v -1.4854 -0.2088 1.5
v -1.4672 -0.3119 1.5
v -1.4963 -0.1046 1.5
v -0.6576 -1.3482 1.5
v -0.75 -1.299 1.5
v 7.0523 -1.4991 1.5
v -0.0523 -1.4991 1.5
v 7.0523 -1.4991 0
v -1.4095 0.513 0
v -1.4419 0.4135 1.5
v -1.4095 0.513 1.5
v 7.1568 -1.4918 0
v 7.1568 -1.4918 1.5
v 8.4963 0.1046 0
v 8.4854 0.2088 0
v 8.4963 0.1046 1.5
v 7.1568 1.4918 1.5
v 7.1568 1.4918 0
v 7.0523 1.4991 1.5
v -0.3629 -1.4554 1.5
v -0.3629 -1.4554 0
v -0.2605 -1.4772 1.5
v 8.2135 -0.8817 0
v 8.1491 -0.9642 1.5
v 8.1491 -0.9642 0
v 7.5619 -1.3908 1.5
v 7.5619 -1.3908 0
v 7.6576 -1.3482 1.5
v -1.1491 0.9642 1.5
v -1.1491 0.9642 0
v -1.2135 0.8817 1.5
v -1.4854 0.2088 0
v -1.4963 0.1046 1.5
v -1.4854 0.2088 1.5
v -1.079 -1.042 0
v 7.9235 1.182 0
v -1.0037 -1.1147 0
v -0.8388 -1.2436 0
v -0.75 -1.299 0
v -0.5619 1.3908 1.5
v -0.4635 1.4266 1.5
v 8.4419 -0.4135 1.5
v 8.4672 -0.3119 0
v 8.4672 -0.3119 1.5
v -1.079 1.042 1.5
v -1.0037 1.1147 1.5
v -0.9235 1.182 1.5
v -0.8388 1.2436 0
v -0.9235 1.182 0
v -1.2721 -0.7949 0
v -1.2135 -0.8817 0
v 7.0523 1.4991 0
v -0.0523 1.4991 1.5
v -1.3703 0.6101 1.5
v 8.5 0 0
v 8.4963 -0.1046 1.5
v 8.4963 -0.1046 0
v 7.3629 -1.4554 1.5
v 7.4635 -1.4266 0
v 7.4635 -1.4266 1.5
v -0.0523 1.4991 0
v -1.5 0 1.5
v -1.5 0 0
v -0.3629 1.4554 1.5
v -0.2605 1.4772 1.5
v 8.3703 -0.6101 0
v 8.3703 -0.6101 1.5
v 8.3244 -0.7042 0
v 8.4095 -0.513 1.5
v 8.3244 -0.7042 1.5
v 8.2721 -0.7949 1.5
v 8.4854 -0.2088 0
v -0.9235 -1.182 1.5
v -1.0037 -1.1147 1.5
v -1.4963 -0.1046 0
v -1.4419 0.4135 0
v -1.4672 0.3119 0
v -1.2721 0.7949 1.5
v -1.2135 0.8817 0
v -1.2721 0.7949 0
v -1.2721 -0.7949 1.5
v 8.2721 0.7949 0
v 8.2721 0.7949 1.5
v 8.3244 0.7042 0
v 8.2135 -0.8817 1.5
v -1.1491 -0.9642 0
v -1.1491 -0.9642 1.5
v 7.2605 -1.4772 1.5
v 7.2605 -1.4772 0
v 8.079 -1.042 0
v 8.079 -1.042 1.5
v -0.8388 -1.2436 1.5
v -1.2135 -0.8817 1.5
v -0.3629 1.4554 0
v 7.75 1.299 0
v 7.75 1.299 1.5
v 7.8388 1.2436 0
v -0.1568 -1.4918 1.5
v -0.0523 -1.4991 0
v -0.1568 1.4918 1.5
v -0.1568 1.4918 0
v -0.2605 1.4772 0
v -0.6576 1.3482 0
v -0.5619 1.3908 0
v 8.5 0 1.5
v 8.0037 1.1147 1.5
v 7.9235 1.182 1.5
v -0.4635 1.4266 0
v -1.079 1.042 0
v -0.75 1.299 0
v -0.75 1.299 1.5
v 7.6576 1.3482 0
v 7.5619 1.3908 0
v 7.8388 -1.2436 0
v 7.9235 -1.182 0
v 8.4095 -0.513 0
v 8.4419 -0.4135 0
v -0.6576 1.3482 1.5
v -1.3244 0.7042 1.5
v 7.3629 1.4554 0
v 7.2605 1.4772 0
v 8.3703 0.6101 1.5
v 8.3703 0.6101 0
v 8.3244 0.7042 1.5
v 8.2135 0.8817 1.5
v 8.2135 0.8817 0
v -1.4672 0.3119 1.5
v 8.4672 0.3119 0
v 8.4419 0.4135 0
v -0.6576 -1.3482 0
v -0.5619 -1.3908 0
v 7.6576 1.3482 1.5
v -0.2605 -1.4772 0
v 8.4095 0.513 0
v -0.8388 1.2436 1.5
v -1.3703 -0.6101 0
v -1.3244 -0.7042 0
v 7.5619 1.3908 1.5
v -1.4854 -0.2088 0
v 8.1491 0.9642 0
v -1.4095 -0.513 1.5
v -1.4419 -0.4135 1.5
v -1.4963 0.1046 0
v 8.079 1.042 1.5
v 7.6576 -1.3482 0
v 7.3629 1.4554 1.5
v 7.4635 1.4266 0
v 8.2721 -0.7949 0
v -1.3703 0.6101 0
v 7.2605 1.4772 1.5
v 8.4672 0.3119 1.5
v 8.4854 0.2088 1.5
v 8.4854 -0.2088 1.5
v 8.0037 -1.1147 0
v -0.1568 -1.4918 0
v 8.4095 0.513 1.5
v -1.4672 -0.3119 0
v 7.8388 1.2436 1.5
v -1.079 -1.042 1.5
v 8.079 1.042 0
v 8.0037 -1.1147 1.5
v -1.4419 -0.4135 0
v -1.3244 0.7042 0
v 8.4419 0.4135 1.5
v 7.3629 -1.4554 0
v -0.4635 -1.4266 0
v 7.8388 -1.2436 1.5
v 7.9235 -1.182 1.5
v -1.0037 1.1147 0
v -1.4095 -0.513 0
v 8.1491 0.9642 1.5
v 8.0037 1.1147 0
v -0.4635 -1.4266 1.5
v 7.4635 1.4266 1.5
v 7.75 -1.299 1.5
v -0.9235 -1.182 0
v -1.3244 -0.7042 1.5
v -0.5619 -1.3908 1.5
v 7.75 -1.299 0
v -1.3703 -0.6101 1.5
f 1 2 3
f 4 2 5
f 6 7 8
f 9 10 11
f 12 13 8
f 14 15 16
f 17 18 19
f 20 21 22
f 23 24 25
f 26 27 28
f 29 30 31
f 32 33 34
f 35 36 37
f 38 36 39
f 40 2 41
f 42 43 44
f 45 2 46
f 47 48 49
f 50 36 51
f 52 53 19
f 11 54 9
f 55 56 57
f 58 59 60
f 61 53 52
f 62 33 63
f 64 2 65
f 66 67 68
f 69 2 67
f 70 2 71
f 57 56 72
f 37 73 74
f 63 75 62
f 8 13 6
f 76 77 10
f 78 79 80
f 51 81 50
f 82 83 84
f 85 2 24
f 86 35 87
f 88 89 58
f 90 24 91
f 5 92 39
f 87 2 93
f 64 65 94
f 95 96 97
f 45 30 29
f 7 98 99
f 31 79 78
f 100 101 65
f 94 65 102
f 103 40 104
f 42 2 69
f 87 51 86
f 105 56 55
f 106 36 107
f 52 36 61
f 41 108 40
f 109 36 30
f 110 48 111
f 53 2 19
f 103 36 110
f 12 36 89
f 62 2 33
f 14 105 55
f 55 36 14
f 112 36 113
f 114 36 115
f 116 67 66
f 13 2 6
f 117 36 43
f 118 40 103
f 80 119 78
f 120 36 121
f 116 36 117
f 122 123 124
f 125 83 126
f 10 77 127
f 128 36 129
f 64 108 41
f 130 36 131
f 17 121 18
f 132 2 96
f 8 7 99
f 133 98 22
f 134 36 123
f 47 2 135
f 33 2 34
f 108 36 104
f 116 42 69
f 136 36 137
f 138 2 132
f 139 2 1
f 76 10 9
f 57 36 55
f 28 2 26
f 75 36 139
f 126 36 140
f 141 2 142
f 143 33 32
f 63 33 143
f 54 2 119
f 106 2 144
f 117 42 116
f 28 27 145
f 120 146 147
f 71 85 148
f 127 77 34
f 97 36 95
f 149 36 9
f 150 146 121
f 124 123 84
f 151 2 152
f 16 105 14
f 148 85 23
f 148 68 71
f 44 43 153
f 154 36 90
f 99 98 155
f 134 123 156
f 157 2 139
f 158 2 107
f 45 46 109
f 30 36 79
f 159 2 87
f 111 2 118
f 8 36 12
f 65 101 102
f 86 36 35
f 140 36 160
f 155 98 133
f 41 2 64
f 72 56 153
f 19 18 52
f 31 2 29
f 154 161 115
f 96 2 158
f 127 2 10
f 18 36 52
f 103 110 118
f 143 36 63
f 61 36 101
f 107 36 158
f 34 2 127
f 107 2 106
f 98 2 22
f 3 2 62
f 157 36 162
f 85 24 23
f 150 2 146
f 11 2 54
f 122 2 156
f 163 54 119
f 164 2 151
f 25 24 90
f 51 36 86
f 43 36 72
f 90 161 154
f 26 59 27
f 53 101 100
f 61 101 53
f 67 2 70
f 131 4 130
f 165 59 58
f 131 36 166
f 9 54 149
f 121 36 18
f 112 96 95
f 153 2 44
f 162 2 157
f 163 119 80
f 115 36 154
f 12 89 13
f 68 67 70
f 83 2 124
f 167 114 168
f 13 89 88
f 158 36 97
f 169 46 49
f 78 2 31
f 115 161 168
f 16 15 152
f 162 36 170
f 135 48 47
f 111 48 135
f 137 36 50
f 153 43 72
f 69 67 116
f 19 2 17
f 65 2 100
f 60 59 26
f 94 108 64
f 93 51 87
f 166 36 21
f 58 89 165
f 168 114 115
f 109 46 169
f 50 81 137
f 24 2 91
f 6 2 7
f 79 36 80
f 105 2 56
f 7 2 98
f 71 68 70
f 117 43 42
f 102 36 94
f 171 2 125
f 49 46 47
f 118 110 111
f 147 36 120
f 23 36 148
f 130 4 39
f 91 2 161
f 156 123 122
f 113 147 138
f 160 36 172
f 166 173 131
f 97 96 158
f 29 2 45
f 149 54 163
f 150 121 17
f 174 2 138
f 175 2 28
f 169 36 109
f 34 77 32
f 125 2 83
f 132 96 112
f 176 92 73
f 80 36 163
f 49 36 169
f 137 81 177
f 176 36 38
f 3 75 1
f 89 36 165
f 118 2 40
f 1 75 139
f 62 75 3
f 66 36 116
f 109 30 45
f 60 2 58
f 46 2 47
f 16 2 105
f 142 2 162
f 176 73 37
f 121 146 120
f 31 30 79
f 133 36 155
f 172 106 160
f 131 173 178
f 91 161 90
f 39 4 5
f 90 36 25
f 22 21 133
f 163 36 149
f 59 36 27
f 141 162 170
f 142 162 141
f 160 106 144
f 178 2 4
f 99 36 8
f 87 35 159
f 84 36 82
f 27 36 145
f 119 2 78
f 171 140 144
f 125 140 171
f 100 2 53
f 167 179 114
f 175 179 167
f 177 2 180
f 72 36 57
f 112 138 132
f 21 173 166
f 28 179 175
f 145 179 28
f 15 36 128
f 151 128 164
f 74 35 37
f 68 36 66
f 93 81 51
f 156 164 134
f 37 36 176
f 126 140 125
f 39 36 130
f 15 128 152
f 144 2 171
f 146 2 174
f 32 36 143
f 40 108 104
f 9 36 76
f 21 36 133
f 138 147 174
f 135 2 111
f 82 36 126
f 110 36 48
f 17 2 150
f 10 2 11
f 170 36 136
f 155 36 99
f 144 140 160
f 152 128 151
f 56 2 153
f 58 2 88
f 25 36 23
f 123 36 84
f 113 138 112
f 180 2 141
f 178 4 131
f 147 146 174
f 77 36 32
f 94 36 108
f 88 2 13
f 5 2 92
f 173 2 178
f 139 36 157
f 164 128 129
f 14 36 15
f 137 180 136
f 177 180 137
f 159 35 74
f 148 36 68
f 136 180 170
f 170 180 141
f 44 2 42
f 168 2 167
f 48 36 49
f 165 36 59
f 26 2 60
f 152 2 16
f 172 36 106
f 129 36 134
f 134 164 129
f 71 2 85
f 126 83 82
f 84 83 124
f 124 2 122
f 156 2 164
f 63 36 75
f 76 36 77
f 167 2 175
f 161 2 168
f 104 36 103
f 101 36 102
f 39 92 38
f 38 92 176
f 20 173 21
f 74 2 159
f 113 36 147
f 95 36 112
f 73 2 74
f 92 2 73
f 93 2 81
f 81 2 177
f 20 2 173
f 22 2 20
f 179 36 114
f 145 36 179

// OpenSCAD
$fn = 90;
_h = 1.5;
_d = 3;
_l = 7;

hull()
{
    cylinder(h=_h,d=_d);
    translate([_l,0,0])
        cylinder(h=_h,d=_d);
}
